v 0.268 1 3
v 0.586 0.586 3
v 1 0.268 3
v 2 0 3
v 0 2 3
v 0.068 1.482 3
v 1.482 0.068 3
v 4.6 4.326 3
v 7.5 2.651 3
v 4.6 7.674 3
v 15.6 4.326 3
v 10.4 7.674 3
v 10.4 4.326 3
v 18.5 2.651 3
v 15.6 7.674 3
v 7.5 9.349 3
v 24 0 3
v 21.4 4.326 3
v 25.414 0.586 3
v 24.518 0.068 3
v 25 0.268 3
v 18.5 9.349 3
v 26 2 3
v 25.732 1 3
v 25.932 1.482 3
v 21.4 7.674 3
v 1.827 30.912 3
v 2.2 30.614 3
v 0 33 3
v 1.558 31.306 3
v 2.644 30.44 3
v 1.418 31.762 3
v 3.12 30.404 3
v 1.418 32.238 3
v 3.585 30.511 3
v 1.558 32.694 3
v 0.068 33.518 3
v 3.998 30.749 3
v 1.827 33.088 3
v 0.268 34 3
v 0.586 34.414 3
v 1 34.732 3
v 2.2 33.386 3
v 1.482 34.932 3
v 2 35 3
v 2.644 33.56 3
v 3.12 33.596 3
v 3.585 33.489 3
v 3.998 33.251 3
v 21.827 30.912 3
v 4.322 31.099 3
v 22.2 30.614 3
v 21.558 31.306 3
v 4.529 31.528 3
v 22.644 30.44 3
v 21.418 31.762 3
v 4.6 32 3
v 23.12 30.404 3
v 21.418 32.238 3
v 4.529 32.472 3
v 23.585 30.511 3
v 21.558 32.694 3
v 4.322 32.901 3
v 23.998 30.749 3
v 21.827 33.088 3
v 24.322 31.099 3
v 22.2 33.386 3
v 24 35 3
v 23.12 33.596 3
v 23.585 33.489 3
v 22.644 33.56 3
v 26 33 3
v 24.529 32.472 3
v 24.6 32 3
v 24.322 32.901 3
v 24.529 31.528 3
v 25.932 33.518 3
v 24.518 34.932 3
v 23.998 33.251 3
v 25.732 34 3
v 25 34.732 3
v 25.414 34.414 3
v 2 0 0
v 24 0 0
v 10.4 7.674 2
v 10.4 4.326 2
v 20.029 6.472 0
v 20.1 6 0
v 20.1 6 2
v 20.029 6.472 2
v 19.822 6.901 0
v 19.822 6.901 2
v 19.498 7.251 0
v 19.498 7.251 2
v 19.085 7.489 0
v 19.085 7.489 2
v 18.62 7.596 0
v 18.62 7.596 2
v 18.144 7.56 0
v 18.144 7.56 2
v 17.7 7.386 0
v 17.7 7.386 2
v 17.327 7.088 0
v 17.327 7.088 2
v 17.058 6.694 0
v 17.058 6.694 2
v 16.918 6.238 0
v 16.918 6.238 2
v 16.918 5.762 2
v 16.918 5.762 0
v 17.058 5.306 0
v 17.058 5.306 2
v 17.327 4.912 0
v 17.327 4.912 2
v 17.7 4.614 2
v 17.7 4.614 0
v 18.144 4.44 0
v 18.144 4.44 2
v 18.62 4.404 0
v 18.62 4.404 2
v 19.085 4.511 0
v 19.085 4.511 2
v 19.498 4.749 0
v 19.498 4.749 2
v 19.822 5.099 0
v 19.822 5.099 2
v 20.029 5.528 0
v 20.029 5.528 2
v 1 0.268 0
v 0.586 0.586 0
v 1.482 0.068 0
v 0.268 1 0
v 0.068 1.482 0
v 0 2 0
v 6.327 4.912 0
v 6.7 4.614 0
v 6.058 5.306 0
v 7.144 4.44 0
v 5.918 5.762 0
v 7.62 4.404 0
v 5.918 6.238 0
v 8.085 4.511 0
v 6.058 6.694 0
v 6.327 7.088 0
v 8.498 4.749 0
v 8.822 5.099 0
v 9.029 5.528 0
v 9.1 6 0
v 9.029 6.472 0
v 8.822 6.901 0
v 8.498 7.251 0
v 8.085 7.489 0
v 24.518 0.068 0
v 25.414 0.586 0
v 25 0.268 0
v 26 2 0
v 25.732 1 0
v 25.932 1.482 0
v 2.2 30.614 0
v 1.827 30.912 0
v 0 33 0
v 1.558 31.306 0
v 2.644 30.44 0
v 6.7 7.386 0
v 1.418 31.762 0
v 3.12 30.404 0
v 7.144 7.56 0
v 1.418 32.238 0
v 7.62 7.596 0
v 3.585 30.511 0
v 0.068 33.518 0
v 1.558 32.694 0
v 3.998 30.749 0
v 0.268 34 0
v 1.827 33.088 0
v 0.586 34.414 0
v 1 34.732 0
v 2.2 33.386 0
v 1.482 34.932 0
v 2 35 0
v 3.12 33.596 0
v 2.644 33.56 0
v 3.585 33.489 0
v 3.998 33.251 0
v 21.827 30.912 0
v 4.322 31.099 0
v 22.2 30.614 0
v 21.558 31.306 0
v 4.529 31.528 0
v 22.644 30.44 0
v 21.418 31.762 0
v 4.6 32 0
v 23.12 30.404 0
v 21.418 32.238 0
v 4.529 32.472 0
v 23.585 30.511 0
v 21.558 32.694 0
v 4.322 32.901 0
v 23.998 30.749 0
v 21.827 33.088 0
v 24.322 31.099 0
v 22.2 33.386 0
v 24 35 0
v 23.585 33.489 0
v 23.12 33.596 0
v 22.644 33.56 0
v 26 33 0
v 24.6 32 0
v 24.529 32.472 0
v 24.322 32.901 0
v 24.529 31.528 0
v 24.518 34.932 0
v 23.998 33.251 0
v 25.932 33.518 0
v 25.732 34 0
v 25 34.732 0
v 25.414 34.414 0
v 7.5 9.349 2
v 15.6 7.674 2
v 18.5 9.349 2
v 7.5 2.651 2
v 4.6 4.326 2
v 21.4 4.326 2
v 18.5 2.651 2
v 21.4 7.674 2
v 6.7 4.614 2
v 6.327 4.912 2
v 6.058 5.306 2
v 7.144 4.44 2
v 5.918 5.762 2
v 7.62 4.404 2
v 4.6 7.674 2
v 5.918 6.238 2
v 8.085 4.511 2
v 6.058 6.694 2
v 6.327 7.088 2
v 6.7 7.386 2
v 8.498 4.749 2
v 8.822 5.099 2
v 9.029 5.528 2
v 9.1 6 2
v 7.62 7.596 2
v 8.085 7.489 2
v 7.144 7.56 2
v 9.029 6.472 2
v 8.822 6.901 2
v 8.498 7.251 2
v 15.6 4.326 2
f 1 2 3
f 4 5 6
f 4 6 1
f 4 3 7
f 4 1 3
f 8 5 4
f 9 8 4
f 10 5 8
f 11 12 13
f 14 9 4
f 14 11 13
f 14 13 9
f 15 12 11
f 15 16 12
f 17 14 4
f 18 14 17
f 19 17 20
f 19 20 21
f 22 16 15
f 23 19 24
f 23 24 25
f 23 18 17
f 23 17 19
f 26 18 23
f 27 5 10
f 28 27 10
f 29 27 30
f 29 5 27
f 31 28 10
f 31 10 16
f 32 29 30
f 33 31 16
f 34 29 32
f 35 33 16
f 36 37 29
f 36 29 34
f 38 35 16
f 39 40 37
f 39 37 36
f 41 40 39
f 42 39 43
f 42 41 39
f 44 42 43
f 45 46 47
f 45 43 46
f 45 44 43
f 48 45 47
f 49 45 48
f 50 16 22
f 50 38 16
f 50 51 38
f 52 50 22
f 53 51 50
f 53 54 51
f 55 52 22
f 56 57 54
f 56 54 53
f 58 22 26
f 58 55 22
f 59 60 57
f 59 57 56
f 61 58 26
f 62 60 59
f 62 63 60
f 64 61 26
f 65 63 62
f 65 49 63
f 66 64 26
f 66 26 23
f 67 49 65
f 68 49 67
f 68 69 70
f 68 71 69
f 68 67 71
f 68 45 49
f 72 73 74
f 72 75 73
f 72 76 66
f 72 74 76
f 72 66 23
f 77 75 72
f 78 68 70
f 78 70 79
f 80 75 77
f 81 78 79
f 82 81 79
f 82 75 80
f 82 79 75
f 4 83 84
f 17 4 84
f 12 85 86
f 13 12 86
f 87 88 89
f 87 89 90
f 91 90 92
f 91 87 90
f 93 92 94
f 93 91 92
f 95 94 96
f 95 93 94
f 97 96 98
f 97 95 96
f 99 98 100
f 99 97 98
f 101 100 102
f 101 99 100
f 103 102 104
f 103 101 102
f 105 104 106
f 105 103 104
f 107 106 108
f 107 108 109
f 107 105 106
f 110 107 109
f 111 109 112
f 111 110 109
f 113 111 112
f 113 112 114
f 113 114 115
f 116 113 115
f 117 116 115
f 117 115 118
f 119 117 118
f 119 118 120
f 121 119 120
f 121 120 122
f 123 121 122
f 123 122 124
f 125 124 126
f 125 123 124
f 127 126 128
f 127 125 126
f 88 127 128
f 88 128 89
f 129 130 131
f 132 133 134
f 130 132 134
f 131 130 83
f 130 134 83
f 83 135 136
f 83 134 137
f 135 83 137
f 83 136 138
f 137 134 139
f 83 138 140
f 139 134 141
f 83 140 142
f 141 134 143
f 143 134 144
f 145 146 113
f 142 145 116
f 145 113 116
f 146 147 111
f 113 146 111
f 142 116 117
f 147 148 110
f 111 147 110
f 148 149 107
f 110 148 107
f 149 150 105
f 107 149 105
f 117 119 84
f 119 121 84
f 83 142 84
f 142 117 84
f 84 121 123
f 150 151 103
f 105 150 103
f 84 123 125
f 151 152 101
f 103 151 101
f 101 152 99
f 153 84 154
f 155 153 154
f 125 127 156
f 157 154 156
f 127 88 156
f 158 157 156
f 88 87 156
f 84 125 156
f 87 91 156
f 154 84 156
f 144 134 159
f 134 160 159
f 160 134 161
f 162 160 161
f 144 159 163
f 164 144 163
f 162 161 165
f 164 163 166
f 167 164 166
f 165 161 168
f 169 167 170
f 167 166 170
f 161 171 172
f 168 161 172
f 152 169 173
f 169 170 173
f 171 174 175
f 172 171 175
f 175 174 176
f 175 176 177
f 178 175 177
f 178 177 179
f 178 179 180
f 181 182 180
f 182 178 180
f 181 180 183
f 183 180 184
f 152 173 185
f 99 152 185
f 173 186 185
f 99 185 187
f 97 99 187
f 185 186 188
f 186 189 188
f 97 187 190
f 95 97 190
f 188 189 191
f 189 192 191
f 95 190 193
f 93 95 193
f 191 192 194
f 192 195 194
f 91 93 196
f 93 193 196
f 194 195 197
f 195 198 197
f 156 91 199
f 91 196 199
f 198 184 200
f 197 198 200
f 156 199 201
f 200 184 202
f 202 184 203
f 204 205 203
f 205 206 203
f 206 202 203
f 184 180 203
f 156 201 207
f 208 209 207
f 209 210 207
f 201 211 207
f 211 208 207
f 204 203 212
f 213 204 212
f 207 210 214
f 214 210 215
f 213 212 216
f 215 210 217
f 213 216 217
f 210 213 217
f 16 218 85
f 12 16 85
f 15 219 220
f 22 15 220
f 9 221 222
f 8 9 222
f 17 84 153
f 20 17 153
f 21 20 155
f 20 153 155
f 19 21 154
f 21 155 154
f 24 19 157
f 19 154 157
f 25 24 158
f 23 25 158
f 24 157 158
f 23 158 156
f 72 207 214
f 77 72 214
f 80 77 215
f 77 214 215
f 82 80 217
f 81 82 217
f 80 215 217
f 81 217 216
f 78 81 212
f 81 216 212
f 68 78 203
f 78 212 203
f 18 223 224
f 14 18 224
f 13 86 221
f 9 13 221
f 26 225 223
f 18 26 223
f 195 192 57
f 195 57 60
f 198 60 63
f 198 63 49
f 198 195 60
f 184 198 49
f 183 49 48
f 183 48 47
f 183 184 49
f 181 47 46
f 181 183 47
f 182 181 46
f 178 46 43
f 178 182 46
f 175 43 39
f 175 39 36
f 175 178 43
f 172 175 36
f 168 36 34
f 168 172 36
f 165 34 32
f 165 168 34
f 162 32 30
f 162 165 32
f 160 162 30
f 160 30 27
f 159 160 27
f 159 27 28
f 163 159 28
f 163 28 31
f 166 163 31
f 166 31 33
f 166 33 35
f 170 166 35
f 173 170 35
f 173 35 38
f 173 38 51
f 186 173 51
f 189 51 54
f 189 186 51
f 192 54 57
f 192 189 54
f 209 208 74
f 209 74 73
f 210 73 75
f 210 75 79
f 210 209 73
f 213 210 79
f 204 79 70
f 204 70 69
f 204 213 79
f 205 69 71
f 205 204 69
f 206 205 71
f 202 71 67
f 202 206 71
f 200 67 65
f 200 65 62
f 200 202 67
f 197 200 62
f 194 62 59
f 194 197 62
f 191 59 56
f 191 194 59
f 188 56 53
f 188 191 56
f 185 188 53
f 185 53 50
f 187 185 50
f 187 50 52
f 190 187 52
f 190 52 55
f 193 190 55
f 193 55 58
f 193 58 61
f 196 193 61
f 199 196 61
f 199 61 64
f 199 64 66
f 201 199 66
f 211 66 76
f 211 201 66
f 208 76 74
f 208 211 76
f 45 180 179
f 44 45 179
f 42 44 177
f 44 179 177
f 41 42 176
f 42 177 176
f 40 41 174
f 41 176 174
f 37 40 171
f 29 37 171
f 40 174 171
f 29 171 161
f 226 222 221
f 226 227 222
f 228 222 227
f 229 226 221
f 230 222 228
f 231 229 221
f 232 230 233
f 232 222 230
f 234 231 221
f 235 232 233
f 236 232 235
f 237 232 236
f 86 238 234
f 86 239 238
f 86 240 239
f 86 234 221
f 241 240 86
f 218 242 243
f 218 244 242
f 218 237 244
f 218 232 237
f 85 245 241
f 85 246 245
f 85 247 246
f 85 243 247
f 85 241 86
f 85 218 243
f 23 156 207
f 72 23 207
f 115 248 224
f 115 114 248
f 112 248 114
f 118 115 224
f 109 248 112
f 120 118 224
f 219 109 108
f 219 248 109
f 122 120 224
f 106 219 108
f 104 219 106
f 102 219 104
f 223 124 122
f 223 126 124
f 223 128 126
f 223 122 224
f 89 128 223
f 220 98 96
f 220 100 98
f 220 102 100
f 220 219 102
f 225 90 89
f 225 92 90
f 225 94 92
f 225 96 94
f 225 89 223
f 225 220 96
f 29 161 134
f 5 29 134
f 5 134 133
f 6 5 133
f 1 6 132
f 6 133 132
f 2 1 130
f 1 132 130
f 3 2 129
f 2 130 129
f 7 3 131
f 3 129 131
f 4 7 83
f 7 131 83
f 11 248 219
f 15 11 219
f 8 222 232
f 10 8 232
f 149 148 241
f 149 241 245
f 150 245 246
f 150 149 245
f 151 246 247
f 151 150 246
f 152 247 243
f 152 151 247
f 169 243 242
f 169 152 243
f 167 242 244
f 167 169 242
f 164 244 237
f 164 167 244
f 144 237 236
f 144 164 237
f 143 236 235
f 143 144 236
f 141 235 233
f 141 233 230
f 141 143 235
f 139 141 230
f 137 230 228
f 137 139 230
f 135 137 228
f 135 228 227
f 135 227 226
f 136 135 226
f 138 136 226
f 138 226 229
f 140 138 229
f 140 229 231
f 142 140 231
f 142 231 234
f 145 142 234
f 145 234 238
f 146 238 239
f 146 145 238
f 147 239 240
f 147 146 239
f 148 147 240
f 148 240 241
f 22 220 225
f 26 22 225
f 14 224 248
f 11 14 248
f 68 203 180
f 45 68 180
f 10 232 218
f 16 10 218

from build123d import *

# Parameters (mm, degrees)
F0_R     = 1.6
F1_DEPTH = 3
F2_DEPTH = 2


with BuildPart() as f1:
    # F0 (on Top) → F1 (new body)
    with BuildSketch(Plane.XY):
        with BuildLine():
            ThreePointArc((0, 2), (0.585786, 0.585786), (2, 0))
            Line((2, 0), (24, 0))
            ThreePointArc((24, 0), (25.414214, 0.585786), (26, 2))
            Line((26, 2), (26, 33))
            ThreePointArc((26, 33), (25.414214, 34.414214), (24, 35))
            Line((24, 35), (2, 35))
            ThreePointArc((2, 35), (0.585786, 34.414214), (0, 33))
            Line((0, 33), (0, 2))
        make_face()
        Polygon((7.5, 2.651368), (4.6, 4.325684), (4.6, 7.674316), (7.5, 9.348632), (10.4, 7.674316), (10.4, 4.325684), align=None, mode=Mode.SUBTRACT)
        Polygon((18.5, 2.651368), (15.6, 4.325684), (15.6, 7.674316), (18.5, 9.348632), (21.4, 7.674316), (21.4, 4.325684), align=None, mode=Mode.SUBTRACT)
        with Locations((3, 32)):
            Circle(F0_R, mode=Mode.SUBTRACT)
        with Locations((23, 32)):
            Circle(F0_R, mode=Mode.SUBTRACT)
    extrude(amount=F1_DEPTH)

    # F0 (on Top) → F2 (join)
    with BuildSketch(Plane.XY):
        Polygon((4.6, 7.674316), (4.6, 4.325684), (7.5, 2.651368), (10.4, 4.325684), (10.4, 7.674316), (7.5, 9.348632), align=None)
        with Locations((7.5, 6)):
            Circle(F0_R, mode=Mode.SUBTRACT)
        Polygon((15.6, 7.674316), (15.6, 4.325684), (18.5, 2.651368), (21.4, 4.325684), (21.4, 7.674316), (18.5, 9.348632), align=None)
        with Locations((18.5, 6)):
            Circle(F0_R, mode=Mode.SUBTRACT)
    extrude(amount=F2_DEPTH)


solid = f1.part
